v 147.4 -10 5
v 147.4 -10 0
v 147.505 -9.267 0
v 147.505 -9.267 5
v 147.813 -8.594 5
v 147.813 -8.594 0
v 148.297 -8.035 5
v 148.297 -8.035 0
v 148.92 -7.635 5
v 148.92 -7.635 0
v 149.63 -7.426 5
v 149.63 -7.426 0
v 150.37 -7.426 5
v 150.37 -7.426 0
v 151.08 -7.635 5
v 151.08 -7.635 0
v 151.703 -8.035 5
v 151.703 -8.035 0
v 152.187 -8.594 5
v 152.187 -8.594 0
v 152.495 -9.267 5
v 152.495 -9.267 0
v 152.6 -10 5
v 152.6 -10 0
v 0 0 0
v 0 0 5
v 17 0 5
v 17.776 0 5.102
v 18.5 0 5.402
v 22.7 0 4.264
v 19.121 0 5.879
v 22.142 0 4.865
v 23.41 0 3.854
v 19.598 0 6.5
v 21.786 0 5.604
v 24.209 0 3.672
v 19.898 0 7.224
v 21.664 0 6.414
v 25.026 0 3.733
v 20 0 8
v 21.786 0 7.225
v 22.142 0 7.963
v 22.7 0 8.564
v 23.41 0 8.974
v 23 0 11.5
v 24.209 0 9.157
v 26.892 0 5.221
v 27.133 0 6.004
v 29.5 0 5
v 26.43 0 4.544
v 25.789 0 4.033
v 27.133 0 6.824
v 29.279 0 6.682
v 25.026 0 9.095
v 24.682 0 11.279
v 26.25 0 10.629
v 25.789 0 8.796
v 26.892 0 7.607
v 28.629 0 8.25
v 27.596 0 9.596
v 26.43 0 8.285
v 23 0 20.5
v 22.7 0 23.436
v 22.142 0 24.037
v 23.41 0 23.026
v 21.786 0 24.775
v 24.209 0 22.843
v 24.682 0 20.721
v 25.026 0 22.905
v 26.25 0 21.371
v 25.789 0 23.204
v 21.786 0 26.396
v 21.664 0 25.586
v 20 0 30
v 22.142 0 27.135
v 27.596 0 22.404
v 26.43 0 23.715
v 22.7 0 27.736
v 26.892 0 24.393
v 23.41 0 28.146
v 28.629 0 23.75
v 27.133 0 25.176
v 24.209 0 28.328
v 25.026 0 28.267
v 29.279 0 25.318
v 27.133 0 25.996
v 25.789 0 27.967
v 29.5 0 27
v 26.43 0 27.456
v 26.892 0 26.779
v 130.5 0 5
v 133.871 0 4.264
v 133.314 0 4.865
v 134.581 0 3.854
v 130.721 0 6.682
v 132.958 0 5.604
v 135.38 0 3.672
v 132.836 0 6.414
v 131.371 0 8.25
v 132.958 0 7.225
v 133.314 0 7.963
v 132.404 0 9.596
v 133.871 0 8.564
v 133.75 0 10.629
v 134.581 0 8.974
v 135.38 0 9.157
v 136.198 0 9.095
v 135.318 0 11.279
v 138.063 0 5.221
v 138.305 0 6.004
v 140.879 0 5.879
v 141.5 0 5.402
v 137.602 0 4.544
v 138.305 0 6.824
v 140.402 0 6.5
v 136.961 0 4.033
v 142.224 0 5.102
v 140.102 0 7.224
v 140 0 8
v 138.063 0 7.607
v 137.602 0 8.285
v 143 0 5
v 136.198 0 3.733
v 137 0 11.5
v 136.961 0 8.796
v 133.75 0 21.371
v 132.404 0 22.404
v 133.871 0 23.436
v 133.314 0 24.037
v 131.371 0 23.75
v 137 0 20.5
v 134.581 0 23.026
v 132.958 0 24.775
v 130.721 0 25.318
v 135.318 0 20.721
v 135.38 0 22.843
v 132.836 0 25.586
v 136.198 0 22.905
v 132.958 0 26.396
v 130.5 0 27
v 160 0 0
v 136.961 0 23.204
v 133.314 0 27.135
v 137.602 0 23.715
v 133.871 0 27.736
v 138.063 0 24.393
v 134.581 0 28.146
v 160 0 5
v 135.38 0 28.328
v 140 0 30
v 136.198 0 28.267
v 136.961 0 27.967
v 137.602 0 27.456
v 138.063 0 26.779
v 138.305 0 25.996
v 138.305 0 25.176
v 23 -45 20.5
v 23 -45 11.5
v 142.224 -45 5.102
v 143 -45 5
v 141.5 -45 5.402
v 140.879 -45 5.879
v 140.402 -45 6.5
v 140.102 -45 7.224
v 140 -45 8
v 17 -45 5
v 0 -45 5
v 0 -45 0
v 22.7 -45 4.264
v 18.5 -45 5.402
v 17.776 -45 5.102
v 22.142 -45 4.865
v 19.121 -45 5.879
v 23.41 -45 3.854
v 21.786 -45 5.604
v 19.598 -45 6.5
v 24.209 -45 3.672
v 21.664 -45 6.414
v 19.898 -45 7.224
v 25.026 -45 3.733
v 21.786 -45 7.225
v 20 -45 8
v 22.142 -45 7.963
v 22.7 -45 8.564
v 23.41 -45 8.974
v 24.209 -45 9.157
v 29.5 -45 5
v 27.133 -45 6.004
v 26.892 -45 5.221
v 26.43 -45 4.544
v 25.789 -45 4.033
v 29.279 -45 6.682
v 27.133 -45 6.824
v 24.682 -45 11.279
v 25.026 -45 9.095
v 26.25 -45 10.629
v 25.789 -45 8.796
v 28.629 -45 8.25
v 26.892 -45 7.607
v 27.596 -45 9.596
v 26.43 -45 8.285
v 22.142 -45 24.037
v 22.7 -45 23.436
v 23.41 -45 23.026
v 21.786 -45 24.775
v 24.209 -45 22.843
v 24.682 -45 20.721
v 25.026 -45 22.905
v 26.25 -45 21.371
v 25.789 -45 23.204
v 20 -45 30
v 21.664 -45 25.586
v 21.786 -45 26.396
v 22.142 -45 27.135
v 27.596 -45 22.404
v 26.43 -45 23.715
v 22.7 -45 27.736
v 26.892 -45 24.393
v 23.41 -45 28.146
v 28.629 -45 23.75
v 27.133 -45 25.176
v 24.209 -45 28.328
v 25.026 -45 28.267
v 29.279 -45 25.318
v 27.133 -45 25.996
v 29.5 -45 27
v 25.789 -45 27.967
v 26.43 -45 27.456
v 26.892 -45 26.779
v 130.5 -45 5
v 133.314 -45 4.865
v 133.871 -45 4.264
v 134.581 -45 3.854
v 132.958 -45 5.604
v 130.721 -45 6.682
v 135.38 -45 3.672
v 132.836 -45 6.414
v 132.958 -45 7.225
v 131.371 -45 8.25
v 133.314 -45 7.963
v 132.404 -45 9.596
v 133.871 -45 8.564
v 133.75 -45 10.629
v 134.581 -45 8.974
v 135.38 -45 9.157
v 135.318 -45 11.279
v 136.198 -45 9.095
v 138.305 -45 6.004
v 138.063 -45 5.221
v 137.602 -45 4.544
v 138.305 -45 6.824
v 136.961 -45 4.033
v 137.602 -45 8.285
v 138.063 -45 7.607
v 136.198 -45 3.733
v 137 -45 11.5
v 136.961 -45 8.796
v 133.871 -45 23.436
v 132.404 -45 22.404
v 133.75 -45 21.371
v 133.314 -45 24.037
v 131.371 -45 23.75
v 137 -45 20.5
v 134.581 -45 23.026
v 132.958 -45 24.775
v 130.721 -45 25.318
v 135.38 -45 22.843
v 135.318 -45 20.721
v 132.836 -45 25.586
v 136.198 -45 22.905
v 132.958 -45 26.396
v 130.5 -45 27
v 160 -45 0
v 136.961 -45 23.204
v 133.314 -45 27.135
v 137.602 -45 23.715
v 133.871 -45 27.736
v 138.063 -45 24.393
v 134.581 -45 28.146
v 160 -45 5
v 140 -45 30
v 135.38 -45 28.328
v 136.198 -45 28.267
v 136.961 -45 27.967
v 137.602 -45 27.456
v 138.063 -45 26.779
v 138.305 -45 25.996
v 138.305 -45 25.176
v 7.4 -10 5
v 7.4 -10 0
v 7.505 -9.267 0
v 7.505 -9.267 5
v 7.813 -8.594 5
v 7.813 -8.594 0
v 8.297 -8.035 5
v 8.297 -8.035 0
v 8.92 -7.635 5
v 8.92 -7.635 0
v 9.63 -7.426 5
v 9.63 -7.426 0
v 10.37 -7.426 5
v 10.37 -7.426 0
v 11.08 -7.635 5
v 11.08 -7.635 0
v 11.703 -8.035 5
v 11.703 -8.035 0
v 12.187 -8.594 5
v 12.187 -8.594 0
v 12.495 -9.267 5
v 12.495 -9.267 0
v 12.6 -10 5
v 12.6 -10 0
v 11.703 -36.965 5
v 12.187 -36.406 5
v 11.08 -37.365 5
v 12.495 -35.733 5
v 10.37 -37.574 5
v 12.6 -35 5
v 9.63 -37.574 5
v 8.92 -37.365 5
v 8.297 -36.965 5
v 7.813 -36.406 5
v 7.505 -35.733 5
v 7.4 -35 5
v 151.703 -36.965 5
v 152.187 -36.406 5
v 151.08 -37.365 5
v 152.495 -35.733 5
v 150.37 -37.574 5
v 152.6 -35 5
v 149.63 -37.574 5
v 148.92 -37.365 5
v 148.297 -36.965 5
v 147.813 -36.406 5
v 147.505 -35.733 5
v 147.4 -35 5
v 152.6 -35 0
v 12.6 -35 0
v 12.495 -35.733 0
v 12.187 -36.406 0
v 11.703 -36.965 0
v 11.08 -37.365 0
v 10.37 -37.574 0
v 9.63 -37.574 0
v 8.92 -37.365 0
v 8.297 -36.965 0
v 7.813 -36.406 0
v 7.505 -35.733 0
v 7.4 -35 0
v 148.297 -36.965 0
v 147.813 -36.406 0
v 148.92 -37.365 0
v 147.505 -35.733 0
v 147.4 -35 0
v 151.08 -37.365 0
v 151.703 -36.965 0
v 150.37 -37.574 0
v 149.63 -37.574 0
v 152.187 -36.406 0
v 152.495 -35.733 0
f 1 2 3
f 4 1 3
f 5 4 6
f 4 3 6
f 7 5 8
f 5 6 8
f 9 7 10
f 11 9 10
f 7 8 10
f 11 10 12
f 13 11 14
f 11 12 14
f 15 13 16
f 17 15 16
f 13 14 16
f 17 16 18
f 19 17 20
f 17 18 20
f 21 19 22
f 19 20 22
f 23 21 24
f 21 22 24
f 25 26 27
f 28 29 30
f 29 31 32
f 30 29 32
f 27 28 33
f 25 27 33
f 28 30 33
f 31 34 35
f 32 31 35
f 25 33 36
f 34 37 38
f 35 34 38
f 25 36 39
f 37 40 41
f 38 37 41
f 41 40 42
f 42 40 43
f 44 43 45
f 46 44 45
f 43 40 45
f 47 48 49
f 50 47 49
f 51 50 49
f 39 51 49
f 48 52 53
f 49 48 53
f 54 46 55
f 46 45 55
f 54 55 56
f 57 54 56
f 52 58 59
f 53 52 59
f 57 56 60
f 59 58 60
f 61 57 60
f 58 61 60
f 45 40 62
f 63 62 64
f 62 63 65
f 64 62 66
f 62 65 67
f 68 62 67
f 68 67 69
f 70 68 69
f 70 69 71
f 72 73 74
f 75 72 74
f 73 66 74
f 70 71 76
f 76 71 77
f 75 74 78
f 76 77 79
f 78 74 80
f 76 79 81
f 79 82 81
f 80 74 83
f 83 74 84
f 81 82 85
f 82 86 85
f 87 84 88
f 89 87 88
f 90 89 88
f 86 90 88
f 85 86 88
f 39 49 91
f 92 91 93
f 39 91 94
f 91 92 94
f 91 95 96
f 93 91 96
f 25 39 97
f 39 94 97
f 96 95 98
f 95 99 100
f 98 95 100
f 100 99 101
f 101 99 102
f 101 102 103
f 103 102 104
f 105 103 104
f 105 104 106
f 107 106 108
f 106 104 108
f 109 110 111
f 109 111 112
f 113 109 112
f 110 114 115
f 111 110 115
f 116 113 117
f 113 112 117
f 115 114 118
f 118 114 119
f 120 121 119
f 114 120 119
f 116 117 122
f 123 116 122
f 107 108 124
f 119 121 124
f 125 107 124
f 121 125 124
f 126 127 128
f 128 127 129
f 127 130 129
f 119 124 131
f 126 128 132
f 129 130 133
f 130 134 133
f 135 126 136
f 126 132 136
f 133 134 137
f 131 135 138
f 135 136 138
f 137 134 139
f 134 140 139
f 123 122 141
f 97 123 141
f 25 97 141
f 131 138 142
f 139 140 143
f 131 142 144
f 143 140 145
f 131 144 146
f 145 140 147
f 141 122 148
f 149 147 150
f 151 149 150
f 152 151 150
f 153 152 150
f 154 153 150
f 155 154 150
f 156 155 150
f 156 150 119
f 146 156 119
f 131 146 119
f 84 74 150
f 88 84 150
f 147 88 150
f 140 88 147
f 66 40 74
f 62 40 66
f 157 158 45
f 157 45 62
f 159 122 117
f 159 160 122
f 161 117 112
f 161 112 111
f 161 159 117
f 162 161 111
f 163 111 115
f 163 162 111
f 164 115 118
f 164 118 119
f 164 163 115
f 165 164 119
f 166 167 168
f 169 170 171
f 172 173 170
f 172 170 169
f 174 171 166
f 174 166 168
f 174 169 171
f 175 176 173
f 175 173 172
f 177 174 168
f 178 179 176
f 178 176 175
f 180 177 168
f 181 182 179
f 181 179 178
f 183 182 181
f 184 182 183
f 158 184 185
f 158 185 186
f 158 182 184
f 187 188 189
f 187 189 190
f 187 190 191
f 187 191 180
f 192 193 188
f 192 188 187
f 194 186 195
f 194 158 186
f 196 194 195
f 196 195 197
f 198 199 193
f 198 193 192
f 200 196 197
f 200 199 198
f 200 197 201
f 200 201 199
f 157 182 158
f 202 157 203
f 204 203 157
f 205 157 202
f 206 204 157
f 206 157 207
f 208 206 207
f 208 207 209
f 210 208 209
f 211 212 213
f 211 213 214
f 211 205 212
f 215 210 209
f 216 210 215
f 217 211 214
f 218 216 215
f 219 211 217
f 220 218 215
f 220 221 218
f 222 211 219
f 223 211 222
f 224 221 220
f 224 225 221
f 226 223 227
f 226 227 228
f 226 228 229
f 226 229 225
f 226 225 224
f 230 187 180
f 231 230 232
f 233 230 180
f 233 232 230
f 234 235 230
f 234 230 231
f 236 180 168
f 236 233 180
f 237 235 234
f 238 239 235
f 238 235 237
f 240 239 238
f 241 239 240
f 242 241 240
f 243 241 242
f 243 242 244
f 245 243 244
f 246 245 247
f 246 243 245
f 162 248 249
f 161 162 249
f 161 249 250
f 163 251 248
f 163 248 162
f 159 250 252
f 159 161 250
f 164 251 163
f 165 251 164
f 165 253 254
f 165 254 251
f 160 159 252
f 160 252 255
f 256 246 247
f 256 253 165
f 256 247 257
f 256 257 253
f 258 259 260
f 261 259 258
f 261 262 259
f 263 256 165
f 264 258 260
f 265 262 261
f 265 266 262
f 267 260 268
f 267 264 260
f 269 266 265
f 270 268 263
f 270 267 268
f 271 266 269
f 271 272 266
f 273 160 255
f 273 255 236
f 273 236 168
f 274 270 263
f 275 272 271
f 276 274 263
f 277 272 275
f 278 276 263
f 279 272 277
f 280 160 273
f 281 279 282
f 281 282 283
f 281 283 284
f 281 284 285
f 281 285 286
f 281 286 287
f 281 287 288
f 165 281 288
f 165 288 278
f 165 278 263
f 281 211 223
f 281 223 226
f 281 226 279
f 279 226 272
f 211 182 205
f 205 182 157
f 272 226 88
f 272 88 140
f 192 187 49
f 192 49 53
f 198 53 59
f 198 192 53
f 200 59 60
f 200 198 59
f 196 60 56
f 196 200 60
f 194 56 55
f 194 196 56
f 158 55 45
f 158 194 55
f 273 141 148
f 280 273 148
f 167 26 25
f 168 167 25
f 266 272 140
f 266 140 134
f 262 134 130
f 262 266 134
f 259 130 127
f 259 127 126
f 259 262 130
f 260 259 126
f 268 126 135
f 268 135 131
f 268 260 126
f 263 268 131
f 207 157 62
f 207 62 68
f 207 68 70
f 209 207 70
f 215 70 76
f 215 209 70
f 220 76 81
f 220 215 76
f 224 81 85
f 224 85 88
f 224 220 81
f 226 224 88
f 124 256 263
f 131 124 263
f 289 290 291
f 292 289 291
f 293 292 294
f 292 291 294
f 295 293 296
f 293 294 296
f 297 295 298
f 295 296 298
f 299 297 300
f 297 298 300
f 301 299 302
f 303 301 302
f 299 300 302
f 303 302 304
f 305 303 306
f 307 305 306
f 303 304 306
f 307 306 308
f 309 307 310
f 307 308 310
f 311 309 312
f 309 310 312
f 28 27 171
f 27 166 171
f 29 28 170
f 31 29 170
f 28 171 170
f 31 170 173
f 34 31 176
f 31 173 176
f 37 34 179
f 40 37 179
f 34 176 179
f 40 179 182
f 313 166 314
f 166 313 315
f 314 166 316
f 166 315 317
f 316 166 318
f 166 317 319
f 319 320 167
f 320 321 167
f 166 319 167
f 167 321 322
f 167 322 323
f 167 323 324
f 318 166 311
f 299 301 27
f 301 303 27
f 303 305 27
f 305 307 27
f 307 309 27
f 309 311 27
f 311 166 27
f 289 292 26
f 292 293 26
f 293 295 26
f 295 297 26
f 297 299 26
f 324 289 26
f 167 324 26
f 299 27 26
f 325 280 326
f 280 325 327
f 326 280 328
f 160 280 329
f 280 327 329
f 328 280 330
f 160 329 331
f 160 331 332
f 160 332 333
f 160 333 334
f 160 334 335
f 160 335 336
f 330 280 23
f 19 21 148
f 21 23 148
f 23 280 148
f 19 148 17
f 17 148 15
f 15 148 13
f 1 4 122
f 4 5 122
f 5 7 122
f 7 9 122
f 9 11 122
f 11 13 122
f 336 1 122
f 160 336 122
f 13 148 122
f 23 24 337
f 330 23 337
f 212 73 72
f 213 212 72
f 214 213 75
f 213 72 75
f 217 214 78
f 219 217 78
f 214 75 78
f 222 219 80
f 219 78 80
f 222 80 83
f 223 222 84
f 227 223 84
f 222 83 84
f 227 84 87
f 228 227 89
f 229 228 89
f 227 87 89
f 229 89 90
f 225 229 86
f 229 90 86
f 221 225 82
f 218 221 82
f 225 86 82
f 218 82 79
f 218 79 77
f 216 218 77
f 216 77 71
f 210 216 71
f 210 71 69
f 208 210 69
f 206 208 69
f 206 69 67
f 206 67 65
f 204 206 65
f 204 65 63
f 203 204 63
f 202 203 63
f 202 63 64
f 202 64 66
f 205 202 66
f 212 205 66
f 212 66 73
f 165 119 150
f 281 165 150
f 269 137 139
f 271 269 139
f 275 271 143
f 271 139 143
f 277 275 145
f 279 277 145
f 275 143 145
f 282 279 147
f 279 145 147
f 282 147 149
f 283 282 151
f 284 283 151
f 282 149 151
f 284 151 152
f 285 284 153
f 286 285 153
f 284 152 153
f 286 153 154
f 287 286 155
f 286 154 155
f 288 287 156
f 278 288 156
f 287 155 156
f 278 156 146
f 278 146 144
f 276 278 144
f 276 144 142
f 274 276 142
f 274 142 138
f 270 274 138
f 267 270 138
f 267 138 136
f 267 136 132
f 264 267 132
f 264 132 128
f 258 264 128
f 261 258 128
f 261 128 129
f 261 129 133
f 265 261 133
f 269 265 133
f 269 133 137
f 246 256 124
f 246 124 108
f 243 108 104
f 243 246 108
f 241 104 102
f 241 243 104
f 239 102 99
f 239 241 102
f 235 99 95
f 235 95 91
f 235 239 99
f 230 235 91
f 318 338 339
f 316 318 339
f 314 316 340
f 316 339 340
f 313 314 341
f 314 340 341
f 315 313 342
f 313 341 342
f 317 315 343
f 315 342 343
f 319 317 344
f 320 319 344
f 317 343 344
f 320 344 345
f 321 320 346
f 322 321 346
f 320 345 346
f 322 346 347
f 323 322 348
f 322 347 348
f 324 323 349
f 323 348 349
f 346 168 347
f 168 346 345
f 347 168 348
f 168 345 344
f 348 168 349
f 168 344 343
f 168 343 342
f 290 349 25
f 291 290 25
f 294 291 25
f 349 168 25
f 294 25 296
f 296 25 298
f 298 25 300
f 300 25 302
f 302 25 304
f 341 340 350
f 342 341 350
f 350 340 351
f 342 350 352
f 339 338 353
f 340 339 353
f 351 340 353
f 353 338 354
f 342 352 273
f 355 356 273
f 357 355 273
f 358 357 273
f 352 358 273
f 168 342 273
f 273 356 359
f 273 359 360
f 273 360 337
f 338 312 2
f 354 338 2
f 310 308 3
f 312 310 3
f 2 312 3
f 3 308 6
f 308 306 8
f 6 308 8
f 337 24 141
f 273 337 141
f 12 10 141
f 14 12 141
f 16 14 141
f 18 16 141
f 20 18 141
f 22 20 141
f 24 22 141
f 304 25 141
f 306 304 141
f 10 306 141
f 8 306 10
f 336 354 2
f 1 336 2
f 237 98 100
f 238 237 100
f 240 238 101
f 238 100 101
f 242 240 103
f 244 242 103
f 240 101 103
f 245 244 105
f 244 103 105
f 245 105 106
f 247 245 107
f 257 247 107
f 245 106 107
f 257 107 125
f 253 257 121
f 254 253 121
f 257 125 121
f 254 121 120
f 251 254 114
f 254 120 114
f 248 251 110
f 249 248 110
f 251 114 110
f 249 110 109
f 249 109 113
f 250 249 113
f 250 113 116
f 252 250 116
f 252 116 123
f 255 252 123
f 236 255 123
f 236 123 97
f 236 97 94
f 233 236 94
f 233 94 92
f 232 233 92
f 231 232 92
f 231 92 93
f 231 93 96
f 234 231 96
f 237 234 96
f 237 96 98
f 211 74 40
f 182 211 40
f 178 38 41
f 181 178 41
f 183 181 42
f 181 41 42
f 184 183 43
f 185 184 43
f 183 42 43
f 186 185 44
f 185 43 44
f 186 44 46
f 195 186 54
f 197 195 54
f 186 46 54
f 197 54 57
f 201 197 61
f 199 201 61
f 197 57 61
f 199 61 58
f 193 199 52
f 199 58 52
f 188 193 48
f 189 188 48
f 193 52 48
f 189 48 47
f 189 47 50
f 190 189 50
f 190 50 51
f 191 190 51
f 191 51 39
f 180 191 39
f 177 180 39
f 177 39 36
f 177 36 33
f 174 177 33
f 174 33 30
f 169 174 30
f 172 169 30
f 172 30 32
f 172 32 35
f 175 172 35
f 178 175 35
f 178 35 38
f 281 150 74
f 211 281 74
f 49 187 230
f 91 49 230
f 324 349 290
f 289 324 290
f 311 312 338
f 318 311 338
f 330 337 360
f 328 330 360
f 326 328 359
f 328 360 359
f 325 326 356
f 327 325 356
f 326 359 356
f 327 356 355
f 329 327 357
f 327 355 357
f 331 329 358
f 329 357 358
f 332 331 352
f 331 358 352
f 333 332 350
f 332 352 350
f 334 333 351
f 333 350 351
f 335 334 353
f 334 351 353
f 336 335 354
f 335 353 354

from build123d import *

# Parameters (mm, degrees)
F1_DEPTH = 45
F2_W     = 114
F2_H     = 22
F3_DEPTH = 50
F5_DEPTH = 45
F6_R     = 3
F8_DEPTH = 5
F10_D    = 5.5


with BuildPart() as f1:
    # F0 (on Front) → F1 (new body)
    with BuildSketch(Plane.XZ):
        Polygon((0, 5), (0, 0), (160, 0), (160, 5), (140, 5), (140, 30), (20, 30), (20, 5), align=None)
    extrude(amount=F1_DEPTH)

    # F2 (on face) → F3 (cut)
    with BuildSketch(Plane.XZ.offset(45)):
        with Locations((80, 16)):
            Rectangle(F2_W, F2_H)
    extrude(amount=-F3_DEPTH, mode=Mode.SUBTRACT)

    # F4 (on face) → F5 (join, through all)
    with BuildSketch(Plane.XZ.offset(45)):
        with BuildLine():
            ThreePointArc((29.5, 5), (27.5961940777, 9.5961940777), (23, 11.5))
            Line((23, 11.5), (23, 5))
            Line((23, 5), (29.5, 5))
        make_face()
        with BuildLine():
            Line((23, 27), (23, 20.5))
            ThreePointArc((23, 20.5), (27.5961940777, 22.4038059223), (29.5, 27))
            Line((29.5, 27), (23, 27))
        make_face()
        with BuildLine():
            Line((137, 27), (130.5, 27))
            ThreePointArc((130.5, 27), (132.4038059223, 22.4038059223), (137, 20.5))
            Line((137, 20.5), (137, 27))
        make_face()
        with BuildLine():
            ThreePointArc((137, 11.5), (132.4038059223, 9.5961940777), (130.5, 5))
            Line((130.5, 5), (137, 5))
            Line((137, 5), (137, 11.5))
        make_face()
    extrude(amount=-F5_DEPTH)

    # F6
    f6_edges = [f1.edges().sort_by_distance(p)[0] for p in [
        (140, -22.5, 5),
        (20, -22.5, 5),
    ]]
    fillet(f6_edges, radius=F6_R)

    # F7 (on face) → F8 (cut, through all)
    with BuildSketch(Plane(origin=(0, 0, 0), x_dir=(1, 0, 0), z_dir=(0, 0, -1))):
        with BuildLine():
            ThreePointArc((12.6, 35), (10, 37.6), (7.4, 35))
            Line((7.4, 35), (7.4, 10))
            ThreePointArc((7.4, 10), (10, 7.4), (12.6, 10))
            Line((12.6, 10), (12.6, 35))
        make_face()
        with BuildLine():
            ThreePointArc((152.6, 35), (150, 37.6), (147.4, 35))
            Line((147.4, 35), (147.4, 10))
            ThreePointArc((147.4, 10), (150, 7.4), (152.6, 10))
            Line((152.6, 10), (152.6, 35))
        make_face()
    extrude(amount=-F8_DEPTH, mode=Mode.SUBTRACT)

    # F10 (through all)
    with Locations(Plane.XZ.offset(45)):
        with Locations((24.4142135624, 25.5857864376), (24.4142135624, 6.4142135624), (135.5857864376, 6.4142135624), (135.5857864376, 25.5857864376)):
            Hole(F10_D / 2)


solid = f1.part
